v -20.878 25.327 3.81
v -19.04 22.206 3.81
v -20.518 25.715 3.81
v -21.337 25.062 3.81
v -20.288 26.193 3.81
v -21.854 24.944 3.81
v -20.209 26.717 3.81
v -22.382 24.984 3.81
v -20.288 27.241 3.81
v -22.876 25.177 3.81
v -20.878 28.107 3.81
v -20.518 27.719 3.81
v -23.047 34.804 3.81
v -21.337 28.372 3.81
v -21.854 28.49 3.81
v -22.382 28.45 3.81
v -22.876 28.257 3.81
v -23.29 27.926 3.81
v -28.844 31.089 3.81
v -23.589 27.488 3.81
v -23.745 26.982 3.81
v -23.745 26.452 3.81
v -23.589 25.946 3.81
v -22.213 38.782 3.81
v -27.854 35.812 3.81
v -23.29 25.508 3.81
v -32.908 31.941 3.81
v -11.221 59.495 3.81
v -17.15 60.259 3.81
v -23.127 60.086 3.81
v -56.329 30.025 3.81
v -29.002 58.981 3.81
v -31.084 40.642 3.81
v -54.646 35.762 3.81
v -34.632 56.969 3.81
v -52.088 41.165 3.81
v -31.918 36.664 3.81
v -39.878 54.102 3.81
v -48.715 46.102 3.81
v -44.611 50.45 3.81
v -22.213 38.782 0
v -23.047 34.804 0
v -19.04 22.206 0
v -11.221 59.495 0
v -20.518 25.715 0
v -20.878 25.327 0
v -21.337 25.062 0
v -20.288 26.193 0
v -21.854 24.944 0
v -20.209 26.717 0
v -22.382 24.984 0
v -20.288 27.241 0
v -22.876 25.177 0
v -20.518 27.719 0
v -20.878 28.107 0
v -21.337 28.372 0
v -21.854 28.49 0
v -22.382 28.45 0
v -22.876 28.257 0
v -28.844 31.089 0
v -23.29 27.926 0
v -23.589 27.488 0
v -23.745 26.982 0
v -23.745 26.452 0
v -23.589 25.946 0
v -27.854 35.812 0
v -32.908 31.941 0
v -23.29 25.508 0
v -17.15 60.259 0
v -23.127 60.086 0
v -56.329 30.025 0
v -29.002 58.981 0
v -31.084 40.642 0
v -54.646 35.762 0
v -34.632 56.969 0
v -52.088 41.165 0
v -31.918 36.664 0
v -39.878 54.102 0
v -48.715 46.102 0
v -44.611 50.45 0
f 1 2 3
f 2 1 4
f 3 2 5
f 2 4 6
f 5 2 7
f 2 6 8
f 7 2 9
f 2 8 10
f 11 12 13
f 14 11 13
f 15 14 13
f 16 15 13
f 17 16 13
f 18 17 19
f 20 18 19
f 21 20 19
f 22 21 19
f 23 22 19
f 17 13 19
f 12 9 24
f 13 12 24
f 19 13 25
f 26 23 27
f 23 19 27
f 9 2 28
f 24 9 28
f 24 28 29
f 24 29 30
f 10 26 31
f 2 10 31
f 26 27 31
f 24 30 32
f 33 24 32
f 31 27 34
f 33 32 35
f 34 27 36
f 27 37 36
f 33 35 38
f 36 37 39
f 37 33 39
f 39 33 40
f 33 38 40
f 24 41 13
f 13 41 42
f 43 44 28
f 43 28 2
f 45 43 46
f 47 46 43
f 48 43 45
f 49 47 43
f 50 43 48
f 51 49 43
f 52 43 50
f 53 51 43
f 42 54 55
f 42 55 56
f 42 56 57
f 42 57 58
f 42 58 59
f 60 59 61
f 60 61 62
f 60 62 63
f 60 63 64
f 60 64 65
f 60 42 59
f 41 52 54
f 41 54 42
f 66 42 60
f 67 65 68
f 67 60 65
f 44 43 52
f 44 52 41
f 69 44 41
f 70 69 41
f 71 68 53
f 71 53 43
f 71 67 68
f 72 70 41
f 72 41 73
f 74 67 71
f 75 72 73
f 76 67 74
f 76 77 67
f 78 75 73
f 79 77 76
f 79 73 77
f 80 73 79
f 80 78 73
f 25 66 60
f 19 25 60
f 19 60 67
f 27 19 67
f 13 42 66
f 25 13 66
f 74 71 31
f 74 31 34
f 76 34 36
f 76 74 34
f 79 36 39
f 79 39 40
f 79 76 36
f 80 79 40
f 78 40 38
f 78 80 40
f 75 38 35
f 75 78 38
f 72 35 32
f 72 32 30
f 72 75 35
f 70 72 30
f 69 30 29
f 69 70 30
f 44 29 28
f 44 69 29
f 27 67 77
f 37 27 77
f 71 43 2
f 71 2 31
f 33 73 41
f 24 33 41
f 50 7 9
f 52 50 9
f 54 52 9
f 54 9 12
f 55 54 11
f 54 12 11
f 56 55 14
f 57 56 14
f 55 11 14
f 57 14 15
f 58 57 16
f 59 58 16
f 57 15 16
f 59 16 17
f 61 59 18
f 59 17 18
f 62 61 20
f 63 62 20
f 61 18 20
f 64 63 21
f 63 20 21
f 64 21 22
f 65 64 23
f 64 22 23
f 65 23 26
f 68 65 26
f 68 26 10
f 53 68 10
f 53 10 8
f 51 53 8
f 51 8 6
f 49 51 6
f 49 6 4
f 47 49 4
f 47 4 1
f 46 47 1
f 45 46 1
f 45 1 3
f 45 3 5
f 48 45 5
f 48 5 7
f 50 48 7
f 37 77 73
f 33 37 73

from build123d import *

# Parameters (mm, degrees)
BOSS_EXTRUDE2_DEPTH = 3.81
SKETCH3_R           = 1.778
CUT_EXTRUDE1_DEPTH  = 83.609172725
CUT_EXTRUDE2_DEPTH  = 83.609172725


with BuildPart() as part:
    # Sketch2 → Boss-Extrude2 (new body)
    with BuildSketch(Plane.XY):
        with BuildLine():
            Line((-11.22087151, 59.495333804), (-19.039557078, 22.20621802))
            Line((-19.039557078, 22.20621802), (-56.328672862, 30.024903588))
            ThreePointArc((-56.328672862, 30.024903588), (-39.878298128, 54.102250241), (-11.22087151, 59.495333804))
        make_face()
    extrude(amount=BOSS_EXTRUDE2_DEPTH)

    # Sketch3 → Cut-Extrude1 (cut, through all)
    with BuildSketch(Plane.XY.offset(3.81)):
        with Locations((-21.986600099, 26.716998155)):
            Circle(SKETCH3_R)
    extrude(amount=-CUT_EXTRUDE1_DEPTH, mode=Mode.SUBTRACT)

    # Sketch4 → Cut-Extrude2 (cut, through all)
    with BuildSketch(Plane(origin=(0, 0, 0), x_dir=(-1, 0, 0), z_dir=(0, 0, -1))):
        Polygon((31.084073207, 40.641701891), (22.213000878, 38.781638338), (23.046994005, 34.804132654), (31.918066334, 36.664196207), align=None)
        Polygon((32.908433172, 31.940908208), (31.918066334, 36.664196207), (27.854066334, 35.812067175), (28.844433172, 31.088779176), align=None)
    extrude(amount=-CUT_EXTRUDE2_DEPTH, mode=Mode.SUBTRACT)


solid = part.part
